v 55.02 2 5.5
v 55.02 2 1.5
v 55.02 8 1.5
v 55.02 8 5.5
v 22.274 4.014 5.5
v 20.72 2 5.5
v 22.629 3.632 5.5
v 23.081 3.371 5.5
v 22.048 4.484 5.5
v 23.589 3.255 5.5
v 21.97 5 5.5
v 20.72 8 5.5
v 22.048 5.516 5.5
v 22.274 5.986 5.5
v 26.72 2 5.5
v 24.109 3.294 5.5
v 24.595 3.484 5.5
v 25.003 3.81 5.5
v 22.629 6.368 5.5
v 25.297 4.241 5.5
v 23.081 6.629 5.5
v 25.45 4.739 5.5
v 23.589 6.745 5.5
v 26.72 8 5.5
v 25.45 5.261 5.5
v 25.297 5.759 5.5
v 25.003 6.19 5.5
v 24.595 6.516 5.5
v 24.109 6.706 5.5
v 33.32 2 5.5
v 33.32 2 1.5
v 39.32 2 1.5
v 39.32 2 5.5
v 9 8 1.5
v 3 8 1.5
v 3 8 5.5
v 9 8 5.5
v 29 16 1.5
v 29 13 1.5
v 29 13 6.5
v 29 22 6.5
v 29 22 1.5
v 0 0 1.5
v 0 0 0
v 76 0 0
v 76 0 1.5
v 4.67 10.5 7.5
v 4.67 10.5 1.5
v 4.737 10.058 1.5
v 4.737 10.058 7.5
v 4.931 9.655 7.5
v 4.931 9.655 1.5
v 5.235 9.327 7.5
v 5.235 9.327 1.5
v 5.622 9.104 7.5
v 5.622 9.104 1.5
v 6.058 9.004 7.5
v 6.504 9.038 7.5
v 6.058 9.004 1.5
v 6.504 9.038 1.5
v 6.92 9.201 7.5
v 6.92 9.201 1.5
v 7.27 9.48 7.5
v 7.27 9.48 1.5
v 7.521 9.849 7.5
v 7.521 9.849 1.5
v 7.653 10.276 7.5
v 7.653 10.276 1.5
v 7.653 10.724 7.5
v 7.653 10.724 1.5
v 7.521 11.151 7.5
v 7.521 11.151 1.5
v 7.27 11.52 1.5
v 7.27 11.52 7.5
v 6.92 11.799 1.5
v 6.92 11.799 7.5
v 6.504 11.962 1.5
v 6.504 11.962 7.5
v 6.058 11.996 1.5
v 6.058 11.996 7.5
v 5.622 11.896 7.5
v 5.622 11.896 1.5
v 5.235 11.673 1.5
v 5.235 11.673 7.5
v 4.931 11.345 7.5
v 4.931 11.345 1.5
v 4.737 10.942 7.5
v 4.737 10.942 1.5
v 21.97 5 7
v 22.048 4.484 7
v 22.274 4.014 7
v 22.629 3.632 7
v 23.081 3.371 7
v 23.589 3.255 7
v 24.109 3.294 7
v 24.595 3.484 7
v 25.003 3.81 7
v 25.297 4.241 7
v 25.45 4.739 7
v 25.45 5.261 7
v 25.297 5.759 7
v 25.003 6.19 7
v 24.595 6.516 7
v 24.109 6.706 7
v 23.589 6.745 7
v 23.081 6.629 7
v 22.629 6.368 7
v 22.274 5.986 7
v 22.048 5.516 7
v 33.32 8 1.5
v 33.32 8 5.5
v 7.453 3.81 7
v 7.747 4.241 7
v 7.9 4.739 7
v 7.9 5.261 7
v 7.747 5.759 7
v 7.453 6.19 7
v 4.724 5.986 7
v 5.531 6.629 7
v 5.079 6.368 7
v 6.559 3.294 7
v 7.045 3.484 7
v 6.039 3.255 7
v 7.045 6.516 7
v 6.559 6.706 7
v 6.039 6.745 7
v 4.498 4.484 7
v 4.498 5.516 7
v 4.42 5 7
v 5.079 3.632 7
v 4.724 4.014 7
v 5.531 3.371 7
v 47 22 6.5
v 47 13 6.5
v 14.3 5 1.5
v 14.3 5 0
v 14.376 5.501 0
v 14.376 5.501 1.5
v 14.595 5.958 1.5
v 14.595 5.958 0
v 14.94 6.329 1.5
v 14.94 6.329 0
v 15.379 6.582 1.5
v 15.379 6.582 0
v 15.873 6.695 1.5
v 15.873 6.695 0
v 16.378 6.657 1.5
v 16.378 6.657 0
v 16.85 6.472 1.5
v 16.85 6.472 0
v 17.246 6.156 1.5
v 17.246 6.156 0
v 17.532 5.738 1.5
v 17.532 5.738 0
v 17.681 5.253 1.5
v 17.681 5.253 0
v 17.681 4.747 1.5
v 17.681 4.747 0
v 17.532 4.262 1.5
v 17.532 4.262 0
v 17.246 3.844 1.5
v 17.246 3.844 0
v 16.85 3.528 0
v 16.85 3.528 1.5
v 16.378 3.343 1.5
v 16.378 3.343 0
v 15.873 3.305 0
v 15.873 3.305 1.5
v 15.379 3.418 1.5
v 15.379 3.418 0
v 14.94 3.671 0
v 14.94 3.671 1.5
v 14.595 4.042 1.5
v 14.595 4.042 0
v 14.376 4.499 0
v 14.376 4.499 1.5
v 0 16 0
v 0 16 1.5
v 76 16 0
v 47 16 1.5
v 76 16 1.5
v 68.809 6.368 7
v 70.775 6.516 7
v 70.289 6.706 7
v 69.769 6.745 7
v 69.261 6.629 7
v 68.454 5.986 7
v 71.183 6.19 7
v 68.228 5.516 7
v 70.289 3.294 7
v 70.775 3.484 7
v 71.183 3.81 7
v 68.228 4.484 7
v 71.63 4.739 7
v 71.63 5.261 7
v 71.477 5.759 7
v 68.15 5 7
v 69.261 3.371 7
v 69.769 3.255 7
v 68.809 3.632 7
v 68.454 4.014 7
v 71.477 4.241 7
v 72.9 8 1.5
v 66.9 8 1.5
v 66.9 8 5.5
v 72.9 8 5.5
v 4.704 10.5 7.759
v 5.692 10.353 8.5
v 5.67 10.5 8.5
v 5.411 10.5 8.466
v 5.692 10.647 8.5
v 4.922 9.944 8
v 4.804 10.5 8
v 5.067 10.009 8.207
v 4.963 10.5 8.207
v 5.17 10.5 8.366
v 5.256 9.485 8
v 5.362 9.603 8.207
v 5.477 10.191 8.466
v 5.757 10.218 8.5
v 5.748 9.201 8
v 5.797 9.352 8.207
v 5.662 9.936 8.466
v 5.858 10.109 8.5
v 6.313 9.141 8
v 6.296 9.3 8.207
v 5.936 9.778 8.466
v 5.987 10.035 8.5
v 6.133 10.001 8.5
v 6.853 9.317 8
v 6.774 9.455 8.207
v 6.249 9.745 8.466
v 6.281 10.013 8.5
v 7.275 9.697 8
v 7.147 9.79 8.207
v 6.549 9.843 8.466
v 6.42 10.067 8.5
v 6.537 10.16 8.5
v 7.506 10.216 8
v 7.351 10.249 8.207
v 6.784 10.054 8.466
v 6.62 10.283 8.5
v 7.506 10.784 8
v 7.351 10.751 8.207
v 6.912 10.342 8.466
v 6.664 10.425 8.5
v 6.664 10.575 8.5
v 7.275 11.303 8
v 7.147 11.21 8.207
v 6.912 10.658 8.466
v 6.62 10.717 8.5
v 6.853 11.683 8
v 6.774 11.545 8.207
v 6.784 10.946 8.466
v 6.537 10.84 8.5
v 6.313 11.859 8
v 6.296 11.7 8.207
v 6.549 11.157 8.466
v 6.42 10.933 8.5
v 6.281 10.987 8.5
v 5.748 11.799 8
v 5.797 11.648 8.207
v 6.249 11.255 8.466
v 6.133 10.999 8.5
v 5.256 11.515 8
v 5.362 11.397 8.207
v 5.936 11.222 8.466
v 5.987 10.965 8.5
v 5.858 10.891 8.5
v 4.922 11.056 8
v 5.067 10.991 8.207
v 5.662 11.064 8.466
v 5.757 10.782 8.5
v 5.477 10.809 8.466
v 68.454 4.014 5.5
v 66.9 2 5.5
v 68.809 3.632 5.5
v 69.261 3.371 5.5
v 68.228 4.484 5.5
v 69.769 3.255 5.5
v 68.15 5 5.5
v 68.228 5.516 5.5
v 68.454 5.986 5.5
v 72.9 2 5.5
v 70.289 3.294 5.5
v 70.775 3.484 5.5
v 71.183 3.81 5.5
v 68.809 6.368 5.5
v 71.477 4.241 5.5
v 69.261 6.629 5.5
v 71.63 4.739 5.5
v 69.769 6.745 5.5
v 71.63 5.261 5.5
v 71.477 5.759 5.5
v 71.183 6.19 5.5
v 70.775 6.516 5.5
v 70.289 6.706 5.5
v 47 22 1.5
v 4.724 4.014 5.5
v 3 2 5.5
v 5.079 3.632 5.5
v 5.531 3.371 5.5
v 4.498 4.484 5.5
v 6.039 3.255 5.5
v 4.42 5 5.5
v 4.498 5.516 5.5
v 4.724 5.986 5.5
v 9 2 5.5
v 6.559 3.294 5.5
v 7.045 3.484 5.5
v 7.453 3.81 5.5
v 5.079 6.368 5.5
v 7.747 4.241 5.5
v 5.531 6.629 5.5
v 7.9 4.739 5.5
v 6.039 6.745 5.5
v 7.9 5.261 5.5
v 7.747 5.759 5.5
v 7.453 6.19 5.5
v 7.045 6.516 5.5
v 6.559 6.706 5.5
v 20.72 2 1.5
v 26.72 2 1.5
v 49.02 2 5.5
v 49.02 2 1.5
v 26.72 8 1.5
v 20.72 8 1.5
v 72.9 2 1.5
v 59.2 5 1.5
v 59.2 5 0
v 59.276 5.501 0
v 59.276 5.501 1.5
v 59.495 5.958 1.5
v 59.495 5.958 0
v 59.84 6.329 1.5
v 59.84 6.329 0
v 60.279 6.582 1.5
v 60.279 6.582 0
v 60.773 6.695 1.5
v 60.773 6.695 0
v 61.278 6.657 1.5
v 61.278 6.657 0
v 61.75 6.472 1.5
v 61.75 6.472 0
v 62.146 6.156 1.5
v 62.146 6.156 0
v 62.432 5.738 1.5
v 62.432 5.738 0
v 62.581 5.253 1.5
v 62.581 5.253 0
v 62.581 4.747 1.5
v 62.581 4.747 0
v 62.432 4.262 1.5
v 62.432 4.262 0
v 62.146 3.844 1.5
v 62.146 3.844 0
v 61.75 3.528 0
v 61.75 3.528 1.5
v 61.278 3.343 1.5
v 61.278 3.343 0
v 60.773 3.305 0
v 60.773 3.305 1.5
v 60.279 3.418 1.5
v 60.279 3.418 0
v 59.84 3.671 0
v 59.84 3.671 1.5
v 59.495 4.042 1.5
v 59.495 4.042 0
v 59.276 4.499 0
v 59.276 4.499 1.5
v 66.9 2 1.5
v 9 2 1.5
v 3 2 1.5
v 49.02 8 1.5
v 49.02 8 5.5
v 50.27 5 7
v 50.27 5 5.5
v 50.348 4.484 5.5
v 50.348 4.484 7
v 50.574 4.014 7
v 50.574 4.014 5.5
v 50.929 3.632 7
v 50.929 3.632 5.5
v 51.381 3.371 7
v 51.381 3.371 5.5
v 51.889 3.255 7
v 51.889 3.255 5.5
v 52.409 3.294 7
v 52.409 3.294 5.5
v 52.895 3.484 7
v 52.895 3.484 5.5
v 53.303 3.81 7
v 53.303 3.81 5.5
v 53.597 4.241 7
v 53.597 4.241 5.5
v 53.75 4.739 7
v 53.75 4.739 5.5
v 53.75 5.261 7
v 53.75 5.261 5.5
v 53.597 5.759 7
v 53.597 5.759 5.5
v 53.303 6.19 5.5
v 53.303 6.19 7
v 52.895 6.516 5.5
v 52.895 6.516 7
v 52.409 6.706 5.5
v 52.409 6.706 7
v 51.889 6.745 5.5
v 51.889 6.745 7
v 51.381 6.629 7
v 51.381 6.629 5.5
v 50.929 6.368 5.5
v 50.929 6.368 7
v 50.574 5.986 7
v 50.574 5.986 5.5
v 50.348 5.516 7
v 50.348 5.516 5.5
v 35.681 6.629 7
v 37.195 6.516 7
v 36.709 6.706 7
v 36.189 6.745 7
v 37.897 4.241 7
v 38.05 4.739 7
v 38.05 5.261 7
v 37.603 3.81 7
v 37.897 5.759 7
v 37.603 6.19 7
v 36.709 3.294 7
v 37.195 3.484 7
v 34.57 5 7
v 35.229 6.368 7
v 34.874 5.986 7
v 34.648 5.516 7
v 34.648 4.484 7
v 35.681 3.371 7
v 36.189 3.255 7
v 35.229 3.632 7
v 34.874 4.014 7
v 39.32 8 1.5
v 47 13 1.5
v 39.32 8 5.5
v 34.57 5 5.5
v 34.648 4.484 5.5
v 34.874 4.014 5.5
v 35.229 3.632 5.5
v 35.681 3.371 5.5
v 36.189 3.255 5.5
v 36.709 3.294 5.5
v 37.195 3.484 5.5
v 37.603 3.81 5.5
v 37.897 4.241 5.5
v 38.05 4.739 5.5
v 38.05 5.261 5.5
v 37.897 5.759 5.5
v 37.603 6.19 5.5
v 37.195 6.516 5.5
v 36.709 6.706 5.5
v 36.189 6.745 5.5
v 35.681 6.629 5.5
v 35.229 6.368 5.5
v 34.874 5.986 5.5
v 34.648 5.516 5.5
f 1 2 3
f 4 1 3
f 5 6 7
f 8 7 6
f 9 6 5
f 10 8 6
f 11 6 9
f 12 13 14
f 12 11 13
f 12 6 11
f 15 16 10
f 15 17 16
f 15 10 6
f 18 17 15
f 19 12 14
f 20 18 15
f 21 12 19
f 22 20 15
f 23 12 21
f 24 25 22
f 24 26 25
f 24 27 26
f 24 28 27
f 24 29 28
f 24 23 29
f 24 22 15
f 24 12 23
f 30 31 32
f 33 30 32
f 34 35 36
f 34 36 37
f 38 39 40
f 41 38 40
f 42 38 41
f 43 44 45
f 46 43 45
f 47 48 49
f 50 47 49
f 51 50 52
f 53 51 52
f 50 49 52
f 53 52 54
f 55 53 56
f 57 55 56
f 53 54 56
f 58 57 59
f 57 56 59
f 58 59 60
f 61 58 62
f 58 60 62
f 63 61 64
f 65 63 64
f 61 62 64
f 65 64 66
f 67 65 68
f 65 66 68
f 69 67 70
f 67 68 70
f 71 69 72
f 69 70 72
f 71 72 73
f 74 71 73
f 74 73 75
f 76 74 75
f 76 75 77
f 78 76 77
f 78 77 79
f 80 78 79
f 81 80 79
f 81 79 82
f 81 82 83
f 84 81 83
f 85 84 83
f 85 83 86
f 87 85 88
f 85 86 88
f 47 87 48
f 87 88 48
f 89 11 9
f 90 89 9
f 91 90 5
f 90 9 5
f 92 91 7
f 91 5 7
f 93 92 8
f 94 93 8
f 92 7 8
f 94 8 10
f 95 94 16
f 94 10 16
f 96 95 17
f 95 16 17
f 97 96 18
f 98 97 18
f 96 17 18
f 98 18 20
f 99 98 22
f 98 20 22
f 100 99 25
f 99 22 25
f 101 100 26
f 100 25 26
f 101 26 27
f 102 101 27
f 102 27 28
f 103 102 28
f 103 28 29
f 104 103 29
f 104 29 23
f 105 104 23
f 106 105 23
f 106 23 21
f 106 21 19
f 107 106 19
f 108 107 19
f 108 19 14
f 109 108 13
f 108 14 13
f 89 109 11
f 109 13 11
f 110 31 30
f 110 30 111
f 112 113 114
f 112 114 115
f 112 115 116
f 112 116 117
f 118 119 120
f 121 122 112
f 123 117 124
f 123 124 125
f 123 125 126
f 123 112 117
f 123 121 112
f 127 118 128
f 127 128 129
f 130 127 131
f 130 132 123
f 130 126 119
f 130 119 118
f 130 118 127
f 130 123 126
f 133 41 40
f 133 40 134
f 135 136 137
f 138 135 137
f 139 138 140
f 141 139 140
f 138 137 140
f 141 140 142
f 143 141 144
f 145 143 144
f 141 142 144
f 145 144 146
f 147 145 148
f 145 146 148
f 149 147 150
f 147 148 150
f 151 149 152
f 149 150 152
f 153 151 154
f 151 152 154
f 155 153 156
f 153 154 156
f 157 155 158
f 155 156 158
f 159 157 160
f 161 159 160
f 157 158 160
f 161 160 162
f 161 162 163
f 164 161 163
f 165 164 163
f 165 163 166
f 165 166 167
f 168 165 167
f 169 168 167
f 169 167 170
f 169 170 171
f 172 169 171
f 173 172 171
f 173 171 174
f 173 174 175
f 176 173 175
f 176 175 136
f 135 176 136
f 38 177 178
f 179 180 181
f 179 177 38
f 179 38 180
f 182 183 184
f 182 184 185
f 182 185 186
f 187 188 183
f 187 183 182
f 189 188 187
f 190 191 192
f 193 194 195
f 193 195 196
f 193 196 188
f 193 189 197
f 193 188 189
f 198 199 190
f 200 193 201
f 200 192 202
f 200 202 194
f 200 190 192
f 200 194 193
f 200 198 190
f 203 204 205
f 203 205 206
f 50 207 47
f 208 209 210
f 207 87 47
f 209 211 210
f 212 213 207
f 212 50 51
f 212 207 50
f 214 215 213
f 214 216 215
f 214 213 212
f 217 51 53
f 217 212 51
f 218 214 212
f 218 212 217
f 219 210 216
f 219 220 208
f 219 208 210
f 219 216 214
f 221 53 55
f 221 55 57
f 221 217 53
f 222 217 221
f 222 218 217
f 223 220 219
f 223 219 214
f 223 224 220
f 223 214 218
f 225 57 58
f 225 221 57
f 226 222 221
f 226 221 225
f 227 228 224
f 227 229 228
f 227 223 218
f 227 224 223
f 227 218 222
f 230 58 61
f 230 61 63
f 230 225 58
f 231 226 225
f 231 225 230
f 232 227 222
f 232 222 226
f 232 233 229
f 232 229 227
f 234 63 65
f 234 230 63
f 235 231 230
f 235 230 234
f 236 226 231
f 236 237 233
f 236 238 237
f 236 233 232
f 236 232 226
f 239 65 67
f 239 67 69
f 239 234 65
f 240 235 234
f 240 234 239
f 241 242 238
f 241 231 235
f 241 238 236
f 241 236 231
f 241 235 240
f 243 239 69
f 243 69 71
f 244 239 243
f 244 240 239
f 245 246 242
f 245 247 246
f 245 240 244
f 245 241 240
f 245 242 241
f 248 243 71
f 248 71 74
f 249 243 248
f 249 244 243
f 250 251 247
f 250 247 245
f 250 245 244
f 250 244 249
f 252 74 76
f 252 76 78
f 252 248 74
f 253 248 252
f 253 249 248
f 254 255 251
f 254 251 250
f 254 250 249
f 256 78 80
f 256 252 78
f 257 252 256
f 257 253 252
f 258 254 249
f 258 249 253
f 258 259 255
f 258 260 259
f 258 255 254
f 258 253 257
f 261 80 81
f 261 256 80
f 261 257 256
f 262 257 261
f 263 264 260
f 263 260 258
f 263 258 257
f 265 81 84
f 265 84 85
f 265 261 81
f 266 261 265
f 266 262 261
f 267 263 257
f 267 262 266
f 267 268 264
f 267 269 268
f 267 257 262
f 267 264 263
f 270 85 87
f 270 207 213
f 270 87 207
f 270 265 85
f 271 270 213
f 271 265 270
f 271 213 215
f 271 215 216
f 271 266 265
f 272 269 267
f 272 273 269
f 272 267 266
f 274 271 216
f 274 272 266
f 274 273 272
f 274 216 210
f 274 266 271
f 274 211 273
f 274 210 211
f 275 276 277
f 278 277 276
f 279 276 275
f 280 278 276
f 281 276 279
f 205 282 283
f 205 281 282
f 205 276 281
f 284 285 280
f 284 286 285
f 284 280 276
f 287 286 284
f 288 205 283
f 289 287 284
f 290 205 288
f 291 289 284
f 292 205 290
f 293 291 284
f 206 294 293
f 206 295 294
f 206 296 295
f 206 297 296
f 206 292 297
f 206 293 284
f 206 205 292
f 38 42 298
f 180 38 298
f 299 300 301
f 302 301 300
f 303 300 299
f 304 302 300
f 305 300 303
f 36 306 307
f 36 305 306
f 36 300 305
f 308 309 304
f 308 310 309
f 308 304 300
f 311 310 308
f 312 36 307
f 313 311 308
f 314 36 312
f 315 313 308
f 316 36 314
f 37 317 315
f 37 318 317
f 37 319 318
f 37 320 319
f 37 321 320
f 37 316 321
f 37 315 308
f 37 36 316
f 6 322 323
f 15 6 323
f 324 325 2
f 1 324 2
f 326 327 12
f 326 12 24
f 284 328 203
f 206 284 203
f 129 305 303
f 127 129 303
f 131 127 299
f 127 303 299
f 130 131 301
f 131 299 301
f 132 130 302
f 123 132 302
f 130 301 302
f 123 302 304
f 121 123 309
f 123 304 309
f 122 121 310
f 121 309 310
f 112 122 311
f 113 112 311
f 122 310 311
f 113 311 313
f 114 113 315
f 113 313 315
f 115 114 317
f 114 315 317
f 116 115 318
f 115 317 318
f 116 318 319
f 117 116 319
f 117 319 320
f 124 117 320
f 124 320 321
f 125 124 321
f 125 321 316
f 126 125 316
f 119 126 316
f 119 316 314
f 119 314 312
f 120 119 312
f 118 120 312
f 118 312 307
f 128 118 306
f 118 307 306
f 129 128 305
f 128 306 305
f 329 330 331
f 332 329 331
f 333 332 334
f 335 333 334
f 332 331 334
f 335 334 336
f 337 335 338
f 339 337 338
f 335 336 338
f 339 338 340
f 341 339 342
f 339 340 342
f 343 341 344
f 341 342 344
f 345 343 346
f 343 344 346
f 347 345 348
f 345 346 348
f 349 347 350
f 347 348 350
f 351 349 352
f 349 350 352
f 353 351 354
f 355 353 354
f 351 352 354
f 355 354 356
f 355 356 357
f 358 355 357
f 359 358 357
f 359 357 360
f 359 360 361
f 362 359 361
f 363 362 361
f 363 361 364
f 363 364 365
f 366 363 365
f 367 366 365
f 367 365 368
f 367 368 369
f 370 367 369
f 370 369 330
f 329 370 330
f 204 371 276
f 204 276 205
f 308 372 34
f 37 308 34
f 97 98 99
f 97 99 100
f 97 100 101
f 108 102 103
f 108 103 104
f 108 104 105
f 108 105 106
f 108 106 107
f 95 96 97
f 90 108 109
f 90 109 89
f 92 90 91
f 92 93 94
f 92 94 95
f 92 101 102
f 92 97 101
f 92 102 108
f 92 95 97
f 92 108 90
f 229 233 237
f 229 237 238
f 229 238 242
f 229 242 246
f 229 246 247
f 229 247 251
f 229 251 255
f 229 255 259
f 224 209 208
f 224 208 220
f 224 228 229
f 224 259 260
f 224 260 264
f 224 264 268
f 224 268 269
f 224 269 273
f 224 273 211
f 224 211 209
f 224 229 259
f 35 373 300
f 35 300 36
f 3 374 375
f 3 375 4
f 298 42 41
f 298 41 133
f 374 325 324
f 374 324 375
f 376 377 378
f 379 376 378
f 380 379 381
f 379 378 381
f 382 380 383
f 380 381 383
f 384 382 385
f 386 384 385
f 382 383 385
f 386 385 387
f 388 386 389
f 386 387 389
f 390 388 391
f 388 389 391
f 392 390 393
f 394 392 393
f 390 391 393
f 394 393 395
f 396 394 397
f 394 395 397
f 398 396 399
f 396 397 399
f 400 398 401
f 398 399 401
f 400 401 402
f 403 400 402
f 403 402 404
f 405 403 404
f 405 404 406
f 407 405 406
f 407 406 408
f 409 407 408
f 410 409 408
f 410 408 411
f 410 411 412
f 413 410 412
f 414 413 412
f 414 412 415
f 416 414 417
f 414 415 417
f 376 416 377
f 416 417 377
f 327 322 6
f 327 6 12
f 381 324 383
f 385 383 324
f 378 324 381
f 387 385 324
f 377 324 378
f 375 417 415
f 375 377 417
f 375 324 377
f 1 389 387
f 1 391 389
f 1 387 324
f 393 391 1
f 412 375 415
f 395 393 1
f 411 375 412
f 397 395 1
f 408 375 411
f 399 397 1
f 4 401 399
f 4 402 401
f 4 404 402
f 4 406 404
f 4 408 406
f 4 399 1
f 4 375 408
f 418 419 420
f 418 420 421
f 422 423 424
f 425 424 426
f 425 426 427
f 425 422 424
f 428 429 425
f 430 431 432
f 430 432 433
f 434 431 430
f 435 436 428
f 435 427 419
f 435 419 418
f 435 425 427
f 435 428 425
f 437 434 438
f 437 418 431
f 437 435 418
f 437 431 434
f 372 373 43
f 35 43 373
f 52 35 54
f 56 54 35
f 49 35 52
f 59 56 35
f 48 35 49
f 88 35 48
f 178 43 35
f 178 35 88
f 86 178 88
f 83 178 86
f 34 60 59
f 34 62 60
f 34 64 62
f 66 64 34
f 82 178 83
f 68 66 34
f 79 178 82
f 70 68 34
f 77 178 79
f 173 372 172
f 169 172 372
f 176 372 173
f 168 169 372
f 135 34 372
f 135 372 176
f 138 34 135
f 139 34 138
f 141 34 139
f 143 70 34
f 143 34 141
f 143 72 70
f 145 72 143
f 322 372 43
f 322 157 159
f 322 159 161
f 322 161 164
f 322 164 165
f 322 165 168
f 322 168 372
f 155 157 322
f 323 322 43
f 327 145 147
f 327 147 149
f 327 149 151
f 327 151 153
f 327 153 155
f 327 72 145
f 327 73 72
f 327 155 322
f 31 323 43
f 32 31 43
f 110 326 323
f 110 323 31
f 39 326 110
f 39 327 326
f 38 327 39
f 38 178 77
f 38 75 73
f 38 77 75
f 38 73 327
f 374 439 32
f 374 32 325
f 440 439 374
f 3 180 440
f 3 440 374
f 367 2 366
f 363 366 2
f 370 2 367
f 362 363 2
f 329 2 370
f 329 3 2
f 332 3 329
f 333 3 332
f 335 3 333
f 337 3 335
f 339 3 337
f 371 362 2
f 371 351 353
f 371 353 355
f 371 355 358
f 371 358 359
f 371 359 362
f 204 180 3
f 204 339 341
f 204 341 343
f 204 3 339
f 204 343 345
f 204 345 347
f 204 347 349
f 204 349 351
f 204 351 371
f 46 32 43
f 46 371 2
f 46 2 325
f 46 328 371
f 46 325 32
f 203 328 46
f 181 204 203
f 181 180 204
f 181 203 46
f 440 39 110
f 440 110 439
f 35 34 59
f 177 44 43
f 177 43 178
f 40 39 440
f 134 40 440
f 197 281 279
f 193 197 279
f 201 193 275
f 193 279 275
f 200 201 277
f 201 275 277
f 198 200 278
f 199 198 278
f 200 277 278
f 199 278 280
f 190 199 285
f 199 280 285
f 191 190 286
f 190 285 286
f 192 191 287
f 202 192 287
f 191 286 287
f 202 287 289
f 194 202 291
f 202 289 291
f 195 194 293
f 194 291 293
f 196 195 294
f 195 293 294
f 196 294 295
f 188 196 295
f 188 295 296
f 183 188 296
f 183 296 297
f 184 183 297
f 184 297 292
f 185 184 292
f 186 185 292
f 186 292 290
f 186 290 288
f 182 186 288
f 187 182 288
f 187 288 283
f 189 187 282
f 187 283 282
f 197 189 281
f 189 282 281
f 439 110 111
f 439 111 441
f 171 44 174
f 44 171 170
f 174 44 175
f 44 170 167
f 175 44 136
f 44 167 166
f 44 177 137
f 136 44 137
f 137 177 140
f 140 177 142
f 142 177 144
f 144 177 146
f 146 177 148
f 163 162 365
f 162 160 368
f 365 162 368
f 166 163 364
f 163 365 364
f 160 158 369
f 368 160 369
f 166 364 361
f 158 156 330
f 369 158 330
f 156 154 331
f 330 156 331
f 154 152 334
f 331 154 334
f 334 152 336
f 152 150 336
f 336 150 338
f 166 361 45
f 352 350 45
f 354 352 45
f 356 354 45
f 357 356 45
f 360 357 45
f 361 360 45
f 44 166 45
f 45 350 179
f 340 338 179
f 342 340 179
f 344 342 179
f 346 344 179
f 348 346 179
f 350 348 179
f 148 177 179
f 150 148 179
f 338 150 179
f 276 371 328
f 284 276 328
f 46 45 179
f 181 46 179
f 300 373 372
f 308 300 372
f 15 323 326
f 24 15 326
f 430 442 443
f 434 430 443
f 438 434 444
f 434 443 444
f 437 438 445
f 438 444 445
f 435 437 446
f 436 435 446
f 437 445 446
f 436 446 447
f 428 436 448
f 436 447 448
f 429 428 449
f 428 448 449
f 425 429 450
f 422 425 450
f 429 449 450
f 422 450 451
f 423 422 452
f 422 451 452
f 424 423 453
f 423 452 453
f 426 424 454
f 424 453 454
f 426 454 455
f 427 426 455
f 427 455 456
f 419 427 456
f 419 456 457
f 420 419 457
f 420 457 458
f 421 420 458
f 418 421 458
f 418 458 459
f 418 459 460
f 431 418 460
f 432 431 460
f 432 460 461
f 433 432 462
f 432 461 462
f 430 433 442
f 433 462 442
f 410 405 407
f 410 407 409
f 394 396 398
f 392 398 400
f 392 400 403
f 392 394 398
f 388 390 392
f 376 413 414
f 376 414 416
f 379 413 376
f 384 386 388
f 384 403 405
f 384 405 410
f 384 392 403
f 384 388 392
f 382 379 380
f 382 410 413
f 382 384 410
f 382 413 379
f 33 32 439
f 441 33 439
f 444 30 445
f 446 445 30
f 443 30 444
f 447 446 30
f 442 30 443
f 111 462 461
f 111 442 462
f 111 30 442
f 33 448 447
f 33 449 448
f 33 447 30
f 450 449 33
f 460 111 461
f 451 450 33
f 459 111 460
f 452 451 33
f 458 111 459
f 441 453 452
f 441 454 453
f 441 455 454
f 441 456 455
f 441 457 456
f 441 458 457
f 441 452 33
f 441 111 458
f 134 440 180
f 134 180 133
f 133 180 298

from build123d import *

# Parameters (mm, degrees)
SKETCH1_W            = 76
SKETCH1_H            = 16
BOSS_EXTRUDE1_DEPTH  = 1.5
SKETCH2_W            = 6
SKETCH2_H            = 6
BOSS_EXTRUDE2_DEPTH  = 4
SKETCH3_R            = 1.75
BOSS_EXTRUDE3_DEPTH  = 1.5
SKETCH7_W            = 6
SKETCH7_H            = 6
BOSS_EXTRUDE4_DEPTH  = 4
SKETCH9_R            = 1.75
BOSS_EXTRUDE5_DEPTH  = 1.5
SKETCH11_W           = 6
SKETCH11_H           = 6
BOSS_EXTRUDE6_DEPTH  = 4
SKETCH13_R           = 1.75
BOSS_EXTRUDE7_DEPTH  = 1.5
SKETCH15_W           = 6
SKETCH15_H           = 6
BOSS_EXTRUDE8_DEPTH  = 4
SKETCH17_R           = 1.75
BOSS_EXTRUDE9_DEPTH  = 1.5
SKETCH19_W           = 6
SKETCH19_H           = 6
BOSS_EXTRUDE10_DEPTH = 4
SKETCH21_R           = 1.75
BOSS_EXTRUDE11_DEPTH = 1.5
SKETCH23_R           = 1.5
BOSS_EXTRUDE12_DEPTH = 7
FILLET1_R            = 1
SKETCH24_W           = 18
SKETCH24_H           = 9
BOSS_EXTRUDE13_DEPTH = 5
M3_CLEARANCE_HOLE2_D = 3.4


with BuildPart() as part:
    # Sketch1 → Boss-Extrude1 (new body)
    with BuildSketch(Plane.XY):
        with Locations((38, 8)):
            Rectangle(SKETCH1_W, SKETCH1_H)
    extrude(amount=BOSS_EXTRUDE1_DEPTH)

    # Sketch2 → Boss-Extrude2 (add)
    with BuildSketch(Plane.XY.offset(1.5)):
        with Locations((6, 5)):
            Rectangle(SKETCH2_W, SKETCH2_H)
    extrude(amount=BOSS_EXTRUDE2_DEPTH)

    # Sketch3 → Boss-Extrude3 (add)
    with BuildSketch(Plane.XY.offset(5.5)):
        with Locations(Location((6.17, 5, 0), (0, 0, 180))):
            Circle(SKETCH3_R)
    extrude(amount=BOSS_EXTRUDE3_DEPTH)

    # Sketch7 → Boss-Extrude4 (add)
    with BuildSketch(Plane(origin=(16.242371321, -0.520498802, 1.5), x_dir=(1, 0, 0), z_dir=(0, 0, 1))):
        with Locations((7.477628679, 5.520498802)):
            Rectangle(SKETCH7_W, SKETCH7_H)
    extrude(amount=BOSS_EXTRUDE4_DEPTH)

    # Sketch9 → Boss-Extrude5 (add)
    with BuildSketch(Plane(origin=(16.242371321, -0.520498802, 5.5), x_dir=(1, 0, 0), z_dir=(0, 0, 1))):
        with Locations(Location((7.477628679, 5.520498802, 0), (0, 0, 180))):
            Circle(SKETCH9_R)
    extrude(amount=BOSS_EXTRUDE5_DEPTH)

    # Sketch11 → Boss-Extrude6 (add)
    with BuildSketch(Plane(origin=(28.595266875, 2.580968484, 1.5), x_dir=(1, 0, 0), z_dir=(0, 0, 1))):
        with Locations((7.724733125, 2.419031516)):
            Rectangle(SKETCH11_W, SKETCH11_H)
    extrude(amount=BOSS_EXTRUDE6_DEPTH)

    # Sketch13 → Boss-Extrude7 (add)
    with BuildSketch(Plane(origin=(28.595266875, 2.580968484, 5.5), x_dir=(1, 0, 0), z_dir=(0, 0, 1))):
        with Locations(Location((7.724733125, 2.419031516, 0), (0, 0, 180))):
            Circle(SKETCH13_R)
    extrude(amount=BOSS_EXTRUDE7_DEPTH)

    # Sketch15 → Boss-Extrude8 (add)
    with BuildSketch(Plane(origin=(42.206058337, 2.089594669, 1.5), x_dir=(1, 0, 0), z_dir=(0, 0, 1))):
        with Locations((9.813941663, 2.910405331)):
            Rectangle(SKETCH15_W, SKETCH15_H)
    extrude(amount=BOSS_EXTRUDE8_DEPTH)

    # Sketch17 → Boss-Extrude9 (add)
    with BuildSketch(Plane(origin=(42.206058337, 2.089594669, 5.5), x_dir=(1, 0, 0), z_dir=(0, 0, 1))):
        with Locations(Location((9.813941663, 2.910405331, 0), (0, 0, 180))):
            Circle(SKETCH17_R)
    extrude(amount=BOSS_EXTRUDE9_DEPTH)

    # Sketch19 → Boss-Extrude10 (add)
    with BuildSketch(Plane(origin=(52.604179533, 1.086479777, 1.5), x_dir=(1, 0, 0), z_dir=(0, 0, 1))):
        with Locations((17.295820467, 3.913520223)):
            Rectangle(SKETCH19_W, SKETCH19_H)
    extrude(amount=BOSS_EXTRUDE10_DEPTH)

    # Sketch21 → Boss-Extrude11 (add)
    with BuildSketch(Plane(origin=(52.604179533, 1.086479777, 5.5), x_dir=(1, 0, 0), z_dir=(0, 0, 1))):
        with Locations(Location((17.295820467, 3.913520223, 0), (0, 0, 180))):
            Circle(SKETCH21_R)
    extrude(amount=BOSS_EXTRUDE11_DEPTH)

    # Sketch23 → Boss-Extrude12 (add)
    with BuildSketch(Plane.XY.offset(1.5)):
        with Locations(Location((6.17, 10.5, 0), (0, 0, 180))):
            Circle(SKETCH23_R)
    extrude(amount=BOSS_EXTRUDE12_DEPTH)

    # Fillet1
    fillet1_edges = [part.edges().sort_by_distance(p)[0] for p in [
        (7.67, 10.5, 8.5),
    ]]
    fillet(fillet1_edges, radius=FILLET1_R)

    # Sketch24 → Boss-Extrude13 (add)
    with BuildSketch(Plane.XY.offset(1.5)):
        with Locations((38, 17.5)):
            Rectangle(SKETCH24_W, SKETCH24_H)
    extrude(amount=BOSS_EXTRUDE13_DEPTH)

    # M3 Clearance Hole2 (through all)
    with Locations(Plane.XY.offset(1.5)):
        with Locations((16, 5), (60.9, 5)):
            Hole(M3_CLEARANCE_HOLE2_D / 2)


solid = part.part
